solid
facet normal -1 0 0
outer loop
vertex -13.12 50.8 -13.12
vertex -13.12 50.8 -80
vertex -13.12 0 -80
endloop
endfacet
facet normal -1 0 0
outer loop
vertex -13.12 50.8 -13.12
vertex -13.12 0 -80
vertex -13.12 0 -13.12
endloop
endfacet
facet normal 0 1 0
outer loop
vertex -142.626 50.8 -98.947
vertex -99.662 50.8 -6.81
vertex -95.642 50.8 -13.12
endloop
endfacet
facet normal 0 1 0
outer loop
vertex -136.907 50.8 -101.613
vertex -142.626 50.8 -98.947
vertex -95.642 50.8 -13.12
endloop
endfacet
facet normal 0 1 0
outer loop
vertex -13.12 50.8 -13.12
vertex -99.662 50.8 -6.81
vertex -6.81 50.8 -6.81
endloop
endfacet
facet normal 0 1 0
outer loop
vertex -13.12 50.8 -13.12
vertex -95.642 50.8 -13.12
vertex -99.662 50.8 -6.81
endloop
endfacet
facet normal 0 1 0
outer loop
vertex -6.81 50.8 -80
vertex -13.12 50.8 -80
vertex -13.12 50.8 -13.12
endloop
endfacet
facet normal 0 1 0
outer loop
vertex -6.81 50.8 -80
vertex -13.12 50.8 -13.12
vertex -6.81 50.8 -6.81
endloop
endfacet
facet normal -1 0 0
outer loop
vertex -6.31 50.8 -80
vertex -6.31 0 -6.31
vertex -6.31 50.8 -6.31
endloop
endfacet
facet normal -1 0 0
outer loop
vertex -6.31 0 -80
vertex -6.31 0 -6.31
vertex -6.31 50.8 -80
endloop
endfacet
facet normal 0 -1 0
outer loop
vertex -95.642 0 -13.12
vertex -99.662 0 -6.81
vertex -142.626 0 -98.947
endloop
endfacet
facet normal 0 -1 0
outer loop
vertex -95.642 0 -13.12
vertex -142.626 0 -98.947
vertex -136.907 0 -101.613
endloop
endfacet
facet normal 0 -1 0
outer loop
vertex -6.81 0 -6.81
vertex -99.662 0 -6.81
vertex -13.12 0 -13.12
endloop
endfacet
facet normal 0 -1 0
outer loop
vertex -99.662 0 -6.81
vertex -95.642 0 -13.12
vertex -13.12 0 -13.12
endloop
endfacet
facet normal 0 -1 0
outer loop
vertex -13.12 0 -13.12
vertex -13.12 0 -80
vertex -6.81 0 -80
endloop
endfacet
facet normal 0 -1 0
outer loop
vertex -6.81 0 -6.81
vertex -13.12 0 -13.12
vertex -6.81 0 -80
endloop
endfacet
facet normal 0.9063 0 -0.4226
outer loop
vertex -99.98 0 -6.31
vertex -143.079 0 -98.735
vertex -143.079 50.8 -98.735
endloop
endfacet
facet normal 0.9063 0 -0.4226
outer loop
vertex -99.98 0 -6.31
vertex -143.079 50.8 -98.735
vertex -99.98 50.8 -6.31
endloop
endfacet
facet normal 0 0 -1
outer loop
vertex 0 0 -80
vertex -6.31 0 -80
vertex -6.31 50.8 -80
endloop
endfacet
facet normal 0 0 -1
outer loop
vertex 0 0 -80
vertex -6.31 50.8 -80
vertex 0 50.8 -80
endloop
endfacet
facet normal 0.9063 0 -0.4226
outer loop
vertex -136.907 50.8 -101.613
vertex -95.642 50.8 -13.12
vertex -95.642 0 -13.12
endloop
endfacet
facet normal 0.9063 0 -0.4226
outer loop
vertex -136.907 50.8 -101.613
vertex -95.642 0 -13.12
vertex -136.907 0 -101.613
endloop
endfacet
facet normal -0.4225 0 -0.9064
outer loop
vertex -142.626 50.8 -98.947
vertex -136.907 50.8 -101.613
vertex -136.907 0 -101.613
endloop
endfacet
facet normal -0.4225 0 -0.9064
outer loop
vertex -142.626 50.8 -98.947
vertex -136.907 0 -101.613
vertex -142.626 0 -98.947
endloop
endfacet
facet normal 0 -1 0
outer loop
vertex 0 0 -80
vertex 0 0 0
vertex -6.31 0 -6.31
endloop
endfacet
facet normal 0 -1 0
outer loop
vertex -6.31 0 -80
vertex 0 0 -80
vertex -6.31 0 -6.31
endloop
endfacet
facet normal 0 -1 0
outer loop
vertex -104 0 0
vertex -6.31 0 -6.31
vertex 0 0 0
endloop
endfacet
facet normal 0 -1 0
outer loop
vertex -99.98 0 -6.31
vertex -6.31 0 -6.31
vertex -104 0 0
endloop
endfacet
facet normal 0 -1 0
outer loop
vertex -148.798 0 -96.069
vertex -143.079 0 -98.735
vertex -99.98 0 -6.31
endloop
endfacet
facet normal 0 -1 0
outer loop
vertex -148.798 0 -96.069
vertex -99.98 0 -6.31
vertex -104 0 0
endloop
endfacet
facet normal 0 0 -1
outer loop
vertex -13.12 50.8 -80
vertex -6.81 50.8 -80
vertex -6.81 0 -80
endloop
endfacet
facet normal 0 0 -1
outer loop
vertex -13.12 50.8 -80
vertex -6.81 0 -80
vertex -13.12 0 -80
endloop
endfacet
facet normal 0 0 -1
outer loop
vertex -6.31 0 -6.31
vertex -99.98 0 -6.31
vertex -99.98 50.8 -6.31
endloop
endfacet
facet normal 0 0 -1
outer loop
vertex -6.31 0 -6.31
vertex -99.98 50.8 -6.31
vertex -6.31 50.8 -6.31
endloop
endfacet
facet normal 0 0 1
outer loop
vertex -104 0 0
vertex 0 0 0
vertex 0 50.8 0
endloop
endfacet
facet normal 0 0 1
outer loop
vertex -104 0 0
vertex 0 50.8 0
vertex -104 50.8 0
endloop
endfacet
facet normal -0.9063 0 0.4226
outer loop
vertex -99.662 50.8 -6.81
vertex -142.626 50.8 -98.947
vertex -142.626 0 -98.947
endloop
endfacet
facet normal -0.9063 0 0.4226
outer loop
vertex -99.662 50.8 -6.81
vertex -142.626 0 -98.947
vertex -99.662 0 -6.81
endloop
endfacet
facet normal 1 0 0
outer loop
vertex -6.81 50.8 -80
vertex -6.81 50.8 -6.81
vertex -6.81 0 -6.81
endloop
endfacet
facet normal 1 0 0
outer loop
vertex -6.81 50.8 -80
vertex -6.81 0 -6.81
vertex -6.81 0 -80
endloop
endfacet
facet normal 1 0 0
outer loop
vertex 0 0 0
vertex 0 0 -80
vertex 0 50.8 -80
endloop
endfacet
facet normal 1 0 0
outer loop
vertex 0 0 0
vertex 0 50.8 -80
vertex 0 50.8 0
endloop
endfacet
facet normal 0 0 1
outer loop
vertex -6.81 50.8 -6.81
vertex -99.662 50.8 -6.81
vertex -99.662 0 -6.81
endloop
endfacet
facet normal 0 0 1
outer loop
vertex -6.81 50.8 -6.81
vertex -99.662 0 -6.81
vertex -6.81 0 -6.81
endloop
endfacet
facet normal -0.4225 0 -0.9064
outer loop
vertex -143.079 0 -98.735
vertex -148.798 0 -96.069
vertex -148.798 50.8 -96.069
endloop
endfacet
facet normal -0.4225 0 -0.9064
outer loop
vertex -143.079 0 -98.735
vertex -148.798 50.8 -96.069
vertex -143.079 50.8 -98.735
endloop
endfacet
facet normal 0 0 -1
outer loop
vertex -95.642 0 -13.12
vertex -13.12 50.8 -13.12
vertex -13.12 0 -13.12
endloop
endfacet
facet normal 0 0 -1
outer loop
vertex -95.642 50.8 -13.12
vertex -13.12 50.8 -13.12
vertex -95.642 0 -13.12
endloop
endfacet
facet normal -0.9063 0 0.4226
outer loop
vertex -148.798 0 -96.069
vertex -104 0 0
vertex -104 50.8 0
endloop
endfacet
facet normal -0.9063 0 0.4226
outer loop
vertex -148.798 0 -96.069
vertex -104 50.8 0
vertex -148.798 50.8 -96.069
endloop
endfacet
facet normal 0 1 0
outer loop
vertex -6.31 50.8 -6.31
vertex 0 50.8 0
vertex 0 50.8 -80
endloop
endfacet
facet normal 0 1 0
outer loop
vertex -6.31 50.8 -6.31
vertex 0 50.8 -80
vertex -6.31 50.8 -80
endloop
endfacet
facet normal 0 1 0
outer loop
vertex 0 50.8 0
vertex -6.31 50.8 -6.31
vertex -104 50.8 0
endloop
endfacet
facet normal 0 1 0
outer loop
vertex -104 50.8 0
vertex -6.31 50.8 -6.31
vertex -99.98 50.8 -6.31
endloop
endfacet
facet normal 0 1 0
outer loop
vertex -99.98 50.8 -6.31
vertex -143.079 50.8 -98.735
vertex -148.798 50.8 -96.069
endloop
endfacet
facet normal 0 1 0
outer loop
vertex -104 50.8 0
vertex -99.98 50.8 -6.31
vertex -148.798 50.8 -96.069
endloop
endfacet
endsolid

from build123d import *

# Parameters (mm, degrees)
SALIENTE_EXTRUIR1_DEPTH = 50.8
SALIENTE_EXTRUIR2_DEPTH = 50.8


with BuildPart() as part:
    # Croquis1 → Saliente-Extruir1 (new body)
    with BuildSketch(Plane(origin=(0, 0, 0), x_dir=(1, 0, 0), z_dir=(0, 1, 0))):
        Polygon((0, 0), (-104, 0), (-148.797535745, 96.068625426), (-143.078733608, 98.735346657), (-99.980086654, 6.31), (-6.31, 6.31), (-6.31, 80), (0, 80), align=None)
    extrude(amount=SALIENTE_EXTRUIR1_DEPTH)


with BuildPart() as body_2:
    # Croquis2 → Saliente-Extruir2 (new body)
    with BuildSketch(Plane(origin=(0, 50.8, 0), x_dir=(1, 0, 0), z_dir=(0, 1, 0))):
        Polygon((-142.625579715, 98.946655788), (-99.661551524, 6.81), (-6.81, 6.81), (-6.81, 80), (-13.12, 80), (-13.12, 13.12), (-95.641638178, 13.12), (-136.906777579, 101.61337702), align=None)
    extrude(amount=-SALIENTE_EXTRUIR2_DEPTH)


solid = Compound([part.part, body_2.part])
